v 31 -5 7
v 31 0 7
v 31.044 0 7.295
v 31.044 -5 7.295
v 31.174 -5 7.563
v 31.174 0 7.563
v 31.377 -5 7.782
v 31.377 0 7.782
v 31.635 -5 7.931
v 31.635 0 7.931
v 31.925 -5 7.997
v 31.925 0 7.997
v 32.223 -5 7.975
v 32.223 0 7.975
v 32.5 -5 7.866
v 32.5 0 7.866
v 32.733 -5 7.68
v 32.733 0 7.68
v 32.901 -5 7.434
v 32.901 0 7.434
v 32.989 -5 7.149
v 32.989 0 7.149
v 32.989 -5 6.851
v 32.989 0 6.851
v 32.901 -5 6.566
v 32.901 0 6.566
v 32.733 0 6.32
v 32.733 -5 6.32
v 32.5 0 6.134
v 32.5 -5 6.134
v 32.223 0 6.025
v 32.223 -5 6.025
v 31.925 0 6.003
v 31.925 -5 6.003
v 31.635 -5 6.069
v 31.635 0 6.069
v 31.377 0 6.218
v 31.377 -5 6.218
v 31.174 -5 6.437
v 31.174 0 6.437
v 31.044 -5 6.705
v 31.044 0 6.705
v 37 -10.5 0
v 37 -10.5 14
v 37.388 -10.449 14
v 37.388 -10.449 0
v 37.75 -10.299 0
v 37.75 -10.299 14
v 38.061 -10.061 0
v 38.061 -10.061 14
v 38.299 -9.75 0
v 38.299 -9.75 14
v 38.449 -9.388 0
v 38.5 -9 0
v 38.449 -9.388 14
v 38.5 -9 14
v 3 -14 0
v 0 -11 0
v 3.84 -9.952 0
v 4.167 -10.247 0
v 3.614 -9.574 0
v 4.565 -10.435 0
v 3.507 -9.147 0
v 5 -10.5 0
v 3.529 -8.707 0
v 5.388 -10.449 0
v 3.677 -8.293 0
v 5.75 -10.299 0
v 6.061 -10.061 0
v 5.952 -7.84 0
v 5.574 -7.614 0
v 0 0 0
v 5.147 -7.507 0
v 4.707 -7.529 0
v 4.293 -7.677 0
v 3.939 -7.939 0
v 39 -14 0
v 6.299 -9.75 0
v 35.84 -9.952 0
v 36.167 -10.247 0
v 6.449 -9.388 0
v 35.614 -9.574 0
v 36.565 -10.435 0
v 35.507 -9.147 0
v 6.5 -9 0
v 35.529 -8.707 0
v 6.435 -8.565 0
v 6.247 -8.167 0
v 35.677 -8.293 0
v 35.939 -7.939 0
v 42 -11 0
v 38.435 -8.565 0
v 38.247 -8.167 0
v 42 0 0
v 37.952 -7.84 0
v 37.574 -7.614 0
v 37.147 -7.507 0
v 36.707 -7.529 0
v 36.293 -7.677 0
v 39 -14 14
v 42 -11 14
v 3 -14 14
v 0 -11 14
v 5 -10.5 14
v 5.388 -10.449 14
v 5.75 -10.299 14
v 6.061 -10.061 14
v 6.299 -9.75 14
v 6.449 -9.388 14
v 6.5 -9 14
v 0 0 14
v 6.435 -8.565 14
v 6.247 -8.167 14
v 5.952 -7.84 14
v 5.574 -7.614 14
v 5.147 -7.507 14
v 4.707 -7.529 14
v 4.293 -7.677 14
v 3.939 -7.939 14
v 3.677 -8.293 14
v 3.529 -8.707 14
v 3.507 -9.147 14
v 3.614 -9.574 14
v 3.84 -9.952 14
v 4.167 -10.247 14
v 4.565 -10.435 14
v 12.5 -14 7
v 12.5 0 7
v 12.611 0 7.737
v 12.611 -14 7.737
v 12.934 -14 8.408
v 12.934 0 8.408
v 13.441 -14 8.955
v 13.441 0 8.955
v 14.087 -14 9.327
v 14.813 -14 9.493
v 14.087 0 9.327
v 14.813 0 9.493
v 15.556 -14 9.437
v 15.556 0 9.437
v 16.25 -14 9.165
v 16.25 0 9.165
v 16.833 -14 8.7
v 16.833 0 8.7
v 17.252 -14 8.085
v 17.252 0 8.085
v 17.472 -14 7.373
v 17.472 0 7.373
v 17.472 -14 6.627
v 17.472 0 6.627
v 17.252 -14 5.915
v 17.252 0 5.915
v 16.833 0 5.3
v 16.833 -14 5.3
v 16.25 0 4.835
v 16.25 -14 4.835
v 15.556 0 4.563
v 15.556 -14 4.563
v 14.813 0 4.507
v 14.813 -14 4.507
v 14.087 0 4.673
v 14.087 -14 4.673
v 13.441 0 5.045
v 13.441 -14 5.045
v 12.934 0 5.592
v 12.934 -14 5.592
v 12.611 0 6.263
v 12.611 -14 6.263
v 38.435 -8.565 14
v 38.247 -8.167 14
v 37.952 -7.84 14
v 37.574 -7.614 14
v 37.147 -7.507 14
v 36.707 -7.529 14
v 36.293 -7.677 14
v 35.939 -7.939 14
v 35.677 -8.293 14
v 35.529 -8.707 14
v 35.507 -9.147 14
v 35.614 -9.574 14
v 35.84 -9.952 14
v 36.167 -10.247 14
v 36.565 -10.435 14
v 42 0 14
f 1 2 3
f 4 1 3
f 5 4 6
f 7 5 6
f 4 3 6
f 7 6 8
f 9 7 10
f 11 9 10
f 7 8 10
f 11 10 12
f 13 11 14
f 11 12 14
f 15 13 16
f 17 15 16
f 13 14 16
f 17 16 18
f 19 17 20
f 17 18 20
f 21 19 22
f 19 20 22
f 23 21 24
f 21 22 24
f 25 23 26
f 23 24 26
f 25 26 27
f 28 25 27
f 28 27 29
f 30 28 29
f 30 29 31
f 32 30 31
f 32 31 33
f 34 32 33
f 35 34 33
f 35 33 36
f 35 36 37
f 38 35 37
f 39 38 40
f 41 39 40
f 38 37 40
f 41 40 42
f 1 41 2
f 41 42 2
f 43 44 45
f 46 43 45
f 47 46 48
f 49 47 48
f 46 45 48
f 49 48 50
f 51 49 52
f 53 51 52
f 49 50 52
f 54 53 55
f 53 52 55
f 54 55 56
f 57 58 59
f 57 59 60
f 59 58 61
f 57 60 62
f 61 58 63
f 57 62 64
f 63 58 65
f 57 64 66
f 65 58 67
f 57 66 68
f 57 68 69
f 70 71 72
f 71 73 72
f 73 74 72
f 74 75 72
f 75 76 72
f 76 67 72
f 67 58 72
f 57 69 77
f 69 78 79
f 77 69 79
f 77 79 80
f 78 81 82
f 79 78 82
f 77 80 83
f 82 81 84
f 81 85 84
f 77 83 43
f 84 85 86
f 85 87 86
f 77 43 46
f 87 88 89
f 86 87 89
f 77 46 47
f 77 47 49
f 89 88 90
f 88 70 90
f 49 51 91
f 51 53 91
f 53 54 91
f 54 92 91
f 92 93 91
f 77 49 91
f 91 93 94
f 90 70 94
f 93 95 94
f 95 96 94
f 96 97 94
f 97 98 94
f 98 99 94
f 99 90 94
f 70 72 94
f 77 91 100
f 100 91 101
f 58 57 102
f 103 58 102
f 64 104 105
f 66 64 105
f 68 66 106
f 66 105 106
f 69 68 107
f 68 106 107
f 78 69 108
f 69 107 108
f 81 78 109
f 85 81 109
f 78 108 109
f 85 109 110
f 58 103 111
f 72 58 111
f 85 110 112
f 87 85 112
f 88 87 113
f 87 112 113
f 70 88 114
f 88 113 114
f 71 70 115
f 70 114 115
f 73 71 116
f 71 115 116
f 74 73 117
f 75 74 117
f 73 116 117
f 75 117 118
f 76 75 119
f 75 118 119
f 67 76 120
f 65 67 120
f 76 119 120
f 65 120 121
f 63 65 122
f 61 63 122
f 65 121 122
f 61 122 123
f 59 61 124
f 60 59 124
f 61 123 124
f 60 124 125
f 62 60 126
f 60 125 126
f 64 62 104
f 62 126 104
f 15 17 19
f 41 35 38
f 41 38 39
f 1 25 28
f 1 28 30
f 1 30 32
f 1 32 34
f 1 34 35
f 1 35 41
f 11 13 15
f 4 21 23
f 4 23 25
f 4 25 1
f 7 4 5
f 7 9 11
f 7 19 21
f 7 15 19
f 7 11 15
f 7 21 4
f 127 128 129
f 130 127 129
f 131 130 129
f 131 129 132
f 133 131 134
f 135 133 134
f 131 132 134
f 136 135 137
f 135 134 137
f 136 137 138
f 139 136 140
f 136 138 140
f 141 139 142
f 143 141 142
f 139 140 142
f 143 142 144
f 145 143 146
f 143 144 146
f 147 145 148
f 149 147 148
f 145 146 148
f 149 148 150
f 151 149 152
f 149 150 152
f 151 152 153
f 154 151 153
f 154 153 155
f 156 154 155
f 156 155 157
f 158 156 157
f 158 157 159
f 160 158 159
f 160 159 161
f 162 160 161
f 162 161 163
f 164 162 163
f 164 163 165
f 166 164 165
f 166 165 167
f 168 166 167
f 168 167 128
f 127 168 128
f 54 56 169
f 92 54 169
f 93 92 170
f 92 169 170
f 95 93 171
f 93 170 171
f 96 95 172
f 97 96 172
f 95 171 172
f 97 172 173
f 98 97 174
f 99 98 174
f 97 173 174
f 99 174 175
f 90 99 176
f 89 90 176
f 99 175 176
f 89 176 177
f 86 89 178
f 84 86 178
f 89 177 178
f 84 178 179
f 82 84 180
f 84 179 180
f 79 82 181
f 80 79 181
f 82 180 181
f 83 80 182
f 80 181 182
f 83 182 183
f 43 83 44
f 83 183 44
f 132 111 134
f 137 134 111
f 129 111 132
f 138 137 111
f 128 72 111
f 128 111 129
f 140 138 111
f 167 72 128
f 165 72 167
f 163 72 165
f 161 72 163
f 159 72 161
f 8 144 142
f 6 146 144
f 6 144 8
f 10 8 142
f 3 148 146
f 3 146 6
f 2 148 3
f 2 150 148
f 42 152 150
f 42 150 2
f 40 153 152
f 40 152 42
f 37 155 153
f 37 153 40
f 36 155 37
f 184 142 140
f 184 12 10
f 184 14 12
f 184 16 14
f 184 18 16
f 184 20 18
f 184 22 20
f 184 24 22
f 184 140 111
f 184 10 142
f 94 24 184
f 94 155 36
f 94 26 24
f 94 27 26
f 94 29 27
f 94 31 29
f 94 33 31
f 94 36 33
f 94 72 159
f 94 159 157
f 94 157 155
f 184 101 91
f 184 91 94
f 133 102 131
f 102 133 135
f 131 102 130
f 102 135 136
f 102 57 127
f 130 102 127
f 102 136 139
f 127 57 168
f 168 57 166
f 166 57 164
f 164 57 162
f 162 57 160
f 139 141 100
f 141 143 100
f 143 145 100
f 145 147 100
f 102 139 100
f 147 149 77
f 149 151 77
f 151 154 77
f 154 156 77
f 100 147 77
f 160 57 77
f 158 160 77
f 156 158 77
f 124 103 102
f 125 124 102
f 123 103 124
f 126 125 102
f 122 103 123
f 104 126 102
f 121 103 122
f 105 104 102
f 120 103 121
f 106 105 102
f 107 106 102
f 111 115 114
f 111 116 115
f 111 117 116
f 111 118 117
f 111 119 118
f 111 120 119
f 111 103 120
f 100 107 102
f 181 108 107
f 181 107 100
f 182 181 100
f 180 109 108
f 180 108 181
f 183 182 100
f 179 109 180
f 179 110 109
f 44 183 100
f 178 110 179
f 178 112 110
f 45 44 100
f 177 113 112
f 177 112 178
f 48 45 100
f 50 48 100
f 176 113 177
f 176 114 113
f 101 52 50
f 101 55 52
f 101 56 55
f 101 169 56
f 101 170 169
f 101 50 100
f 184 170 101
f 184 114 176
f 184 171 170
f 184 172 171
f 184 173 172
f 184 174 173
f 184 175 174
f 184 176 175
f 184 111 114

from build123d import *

# Parameters (mm, degrees)
F0_W     = 42
F0_H     = 14
F1_DEPTH = 14
F3_DEPTH = 25
F5_DEPTH = 5
F6_R     = 2.5
F7_DEPTH = 25
F8_SIZE  = 3


with BuildPart() as f1:
    # F0 (on Top) → F1 (new body)
    with BuildSketch(Plane.XY):
        with Locations((21, -7)):
            Rectangle(F0_W, F0_H)
    extrude(amount=F1_DEPTH)

    # F2 (on face) → F3 (cut)
    with BuildSketch(Plane.XY.offset(14)):
        with BuildLine():
            ThreePointArc((5, -10.5), (6.06066, -10.06066), (6.5, -9))
            ThreePointArc((6.5, -9), (3.93934, -7.93934), (5, -10.5))
        make_face()
        with BuildLine():
            ThreePointArc((37, -10.5), (38.06066, -10.06066), (38.5, -9))
            ThreePointArc((38.5, -9), (35.93934, -7.93934), (37, -10.5))
        make_face()
    extrude(amount=-F3_DEPTH, mode=Mode.SUBTRACT)

    # F4 (on face) → F5 (cut)
    with BuildSketch(Plane(origin=(0, 0, 0), x_dir=(-1, 0, 0), z_dir=(0, 1, 0))):
        with BuildLine():
            ThreePointArc((-33, 7), (-32, 6), (-31, 7))
            ThreePointArc((-31, 7), (-32, 8), (-33, 7))
        make_face()
    extrude(amount=-F5_DEPTH, mode=Mode.SUBTRACT)

    # F6 (on face) → F7 (cut)
    with BuildSketch(Plane(origin=(0, 0, 0), x_dir=(-1, 0, 0), z_dir=(0, 1, 0))):
        with Locations((-15, 7)):
            Circle(F6_R)
    extrude(amount=-F7_DEPTH, mode=Mode.SUBTRACT)

    # F8
    f8_edges = [f1.edges().sort_by_distance(p)[0] for p in [
        (0, -14, 7),
        (42, -14, 7),
    ]]
    chamfer(f8_edges, length=F8_SIZE)


solid = f1.part
